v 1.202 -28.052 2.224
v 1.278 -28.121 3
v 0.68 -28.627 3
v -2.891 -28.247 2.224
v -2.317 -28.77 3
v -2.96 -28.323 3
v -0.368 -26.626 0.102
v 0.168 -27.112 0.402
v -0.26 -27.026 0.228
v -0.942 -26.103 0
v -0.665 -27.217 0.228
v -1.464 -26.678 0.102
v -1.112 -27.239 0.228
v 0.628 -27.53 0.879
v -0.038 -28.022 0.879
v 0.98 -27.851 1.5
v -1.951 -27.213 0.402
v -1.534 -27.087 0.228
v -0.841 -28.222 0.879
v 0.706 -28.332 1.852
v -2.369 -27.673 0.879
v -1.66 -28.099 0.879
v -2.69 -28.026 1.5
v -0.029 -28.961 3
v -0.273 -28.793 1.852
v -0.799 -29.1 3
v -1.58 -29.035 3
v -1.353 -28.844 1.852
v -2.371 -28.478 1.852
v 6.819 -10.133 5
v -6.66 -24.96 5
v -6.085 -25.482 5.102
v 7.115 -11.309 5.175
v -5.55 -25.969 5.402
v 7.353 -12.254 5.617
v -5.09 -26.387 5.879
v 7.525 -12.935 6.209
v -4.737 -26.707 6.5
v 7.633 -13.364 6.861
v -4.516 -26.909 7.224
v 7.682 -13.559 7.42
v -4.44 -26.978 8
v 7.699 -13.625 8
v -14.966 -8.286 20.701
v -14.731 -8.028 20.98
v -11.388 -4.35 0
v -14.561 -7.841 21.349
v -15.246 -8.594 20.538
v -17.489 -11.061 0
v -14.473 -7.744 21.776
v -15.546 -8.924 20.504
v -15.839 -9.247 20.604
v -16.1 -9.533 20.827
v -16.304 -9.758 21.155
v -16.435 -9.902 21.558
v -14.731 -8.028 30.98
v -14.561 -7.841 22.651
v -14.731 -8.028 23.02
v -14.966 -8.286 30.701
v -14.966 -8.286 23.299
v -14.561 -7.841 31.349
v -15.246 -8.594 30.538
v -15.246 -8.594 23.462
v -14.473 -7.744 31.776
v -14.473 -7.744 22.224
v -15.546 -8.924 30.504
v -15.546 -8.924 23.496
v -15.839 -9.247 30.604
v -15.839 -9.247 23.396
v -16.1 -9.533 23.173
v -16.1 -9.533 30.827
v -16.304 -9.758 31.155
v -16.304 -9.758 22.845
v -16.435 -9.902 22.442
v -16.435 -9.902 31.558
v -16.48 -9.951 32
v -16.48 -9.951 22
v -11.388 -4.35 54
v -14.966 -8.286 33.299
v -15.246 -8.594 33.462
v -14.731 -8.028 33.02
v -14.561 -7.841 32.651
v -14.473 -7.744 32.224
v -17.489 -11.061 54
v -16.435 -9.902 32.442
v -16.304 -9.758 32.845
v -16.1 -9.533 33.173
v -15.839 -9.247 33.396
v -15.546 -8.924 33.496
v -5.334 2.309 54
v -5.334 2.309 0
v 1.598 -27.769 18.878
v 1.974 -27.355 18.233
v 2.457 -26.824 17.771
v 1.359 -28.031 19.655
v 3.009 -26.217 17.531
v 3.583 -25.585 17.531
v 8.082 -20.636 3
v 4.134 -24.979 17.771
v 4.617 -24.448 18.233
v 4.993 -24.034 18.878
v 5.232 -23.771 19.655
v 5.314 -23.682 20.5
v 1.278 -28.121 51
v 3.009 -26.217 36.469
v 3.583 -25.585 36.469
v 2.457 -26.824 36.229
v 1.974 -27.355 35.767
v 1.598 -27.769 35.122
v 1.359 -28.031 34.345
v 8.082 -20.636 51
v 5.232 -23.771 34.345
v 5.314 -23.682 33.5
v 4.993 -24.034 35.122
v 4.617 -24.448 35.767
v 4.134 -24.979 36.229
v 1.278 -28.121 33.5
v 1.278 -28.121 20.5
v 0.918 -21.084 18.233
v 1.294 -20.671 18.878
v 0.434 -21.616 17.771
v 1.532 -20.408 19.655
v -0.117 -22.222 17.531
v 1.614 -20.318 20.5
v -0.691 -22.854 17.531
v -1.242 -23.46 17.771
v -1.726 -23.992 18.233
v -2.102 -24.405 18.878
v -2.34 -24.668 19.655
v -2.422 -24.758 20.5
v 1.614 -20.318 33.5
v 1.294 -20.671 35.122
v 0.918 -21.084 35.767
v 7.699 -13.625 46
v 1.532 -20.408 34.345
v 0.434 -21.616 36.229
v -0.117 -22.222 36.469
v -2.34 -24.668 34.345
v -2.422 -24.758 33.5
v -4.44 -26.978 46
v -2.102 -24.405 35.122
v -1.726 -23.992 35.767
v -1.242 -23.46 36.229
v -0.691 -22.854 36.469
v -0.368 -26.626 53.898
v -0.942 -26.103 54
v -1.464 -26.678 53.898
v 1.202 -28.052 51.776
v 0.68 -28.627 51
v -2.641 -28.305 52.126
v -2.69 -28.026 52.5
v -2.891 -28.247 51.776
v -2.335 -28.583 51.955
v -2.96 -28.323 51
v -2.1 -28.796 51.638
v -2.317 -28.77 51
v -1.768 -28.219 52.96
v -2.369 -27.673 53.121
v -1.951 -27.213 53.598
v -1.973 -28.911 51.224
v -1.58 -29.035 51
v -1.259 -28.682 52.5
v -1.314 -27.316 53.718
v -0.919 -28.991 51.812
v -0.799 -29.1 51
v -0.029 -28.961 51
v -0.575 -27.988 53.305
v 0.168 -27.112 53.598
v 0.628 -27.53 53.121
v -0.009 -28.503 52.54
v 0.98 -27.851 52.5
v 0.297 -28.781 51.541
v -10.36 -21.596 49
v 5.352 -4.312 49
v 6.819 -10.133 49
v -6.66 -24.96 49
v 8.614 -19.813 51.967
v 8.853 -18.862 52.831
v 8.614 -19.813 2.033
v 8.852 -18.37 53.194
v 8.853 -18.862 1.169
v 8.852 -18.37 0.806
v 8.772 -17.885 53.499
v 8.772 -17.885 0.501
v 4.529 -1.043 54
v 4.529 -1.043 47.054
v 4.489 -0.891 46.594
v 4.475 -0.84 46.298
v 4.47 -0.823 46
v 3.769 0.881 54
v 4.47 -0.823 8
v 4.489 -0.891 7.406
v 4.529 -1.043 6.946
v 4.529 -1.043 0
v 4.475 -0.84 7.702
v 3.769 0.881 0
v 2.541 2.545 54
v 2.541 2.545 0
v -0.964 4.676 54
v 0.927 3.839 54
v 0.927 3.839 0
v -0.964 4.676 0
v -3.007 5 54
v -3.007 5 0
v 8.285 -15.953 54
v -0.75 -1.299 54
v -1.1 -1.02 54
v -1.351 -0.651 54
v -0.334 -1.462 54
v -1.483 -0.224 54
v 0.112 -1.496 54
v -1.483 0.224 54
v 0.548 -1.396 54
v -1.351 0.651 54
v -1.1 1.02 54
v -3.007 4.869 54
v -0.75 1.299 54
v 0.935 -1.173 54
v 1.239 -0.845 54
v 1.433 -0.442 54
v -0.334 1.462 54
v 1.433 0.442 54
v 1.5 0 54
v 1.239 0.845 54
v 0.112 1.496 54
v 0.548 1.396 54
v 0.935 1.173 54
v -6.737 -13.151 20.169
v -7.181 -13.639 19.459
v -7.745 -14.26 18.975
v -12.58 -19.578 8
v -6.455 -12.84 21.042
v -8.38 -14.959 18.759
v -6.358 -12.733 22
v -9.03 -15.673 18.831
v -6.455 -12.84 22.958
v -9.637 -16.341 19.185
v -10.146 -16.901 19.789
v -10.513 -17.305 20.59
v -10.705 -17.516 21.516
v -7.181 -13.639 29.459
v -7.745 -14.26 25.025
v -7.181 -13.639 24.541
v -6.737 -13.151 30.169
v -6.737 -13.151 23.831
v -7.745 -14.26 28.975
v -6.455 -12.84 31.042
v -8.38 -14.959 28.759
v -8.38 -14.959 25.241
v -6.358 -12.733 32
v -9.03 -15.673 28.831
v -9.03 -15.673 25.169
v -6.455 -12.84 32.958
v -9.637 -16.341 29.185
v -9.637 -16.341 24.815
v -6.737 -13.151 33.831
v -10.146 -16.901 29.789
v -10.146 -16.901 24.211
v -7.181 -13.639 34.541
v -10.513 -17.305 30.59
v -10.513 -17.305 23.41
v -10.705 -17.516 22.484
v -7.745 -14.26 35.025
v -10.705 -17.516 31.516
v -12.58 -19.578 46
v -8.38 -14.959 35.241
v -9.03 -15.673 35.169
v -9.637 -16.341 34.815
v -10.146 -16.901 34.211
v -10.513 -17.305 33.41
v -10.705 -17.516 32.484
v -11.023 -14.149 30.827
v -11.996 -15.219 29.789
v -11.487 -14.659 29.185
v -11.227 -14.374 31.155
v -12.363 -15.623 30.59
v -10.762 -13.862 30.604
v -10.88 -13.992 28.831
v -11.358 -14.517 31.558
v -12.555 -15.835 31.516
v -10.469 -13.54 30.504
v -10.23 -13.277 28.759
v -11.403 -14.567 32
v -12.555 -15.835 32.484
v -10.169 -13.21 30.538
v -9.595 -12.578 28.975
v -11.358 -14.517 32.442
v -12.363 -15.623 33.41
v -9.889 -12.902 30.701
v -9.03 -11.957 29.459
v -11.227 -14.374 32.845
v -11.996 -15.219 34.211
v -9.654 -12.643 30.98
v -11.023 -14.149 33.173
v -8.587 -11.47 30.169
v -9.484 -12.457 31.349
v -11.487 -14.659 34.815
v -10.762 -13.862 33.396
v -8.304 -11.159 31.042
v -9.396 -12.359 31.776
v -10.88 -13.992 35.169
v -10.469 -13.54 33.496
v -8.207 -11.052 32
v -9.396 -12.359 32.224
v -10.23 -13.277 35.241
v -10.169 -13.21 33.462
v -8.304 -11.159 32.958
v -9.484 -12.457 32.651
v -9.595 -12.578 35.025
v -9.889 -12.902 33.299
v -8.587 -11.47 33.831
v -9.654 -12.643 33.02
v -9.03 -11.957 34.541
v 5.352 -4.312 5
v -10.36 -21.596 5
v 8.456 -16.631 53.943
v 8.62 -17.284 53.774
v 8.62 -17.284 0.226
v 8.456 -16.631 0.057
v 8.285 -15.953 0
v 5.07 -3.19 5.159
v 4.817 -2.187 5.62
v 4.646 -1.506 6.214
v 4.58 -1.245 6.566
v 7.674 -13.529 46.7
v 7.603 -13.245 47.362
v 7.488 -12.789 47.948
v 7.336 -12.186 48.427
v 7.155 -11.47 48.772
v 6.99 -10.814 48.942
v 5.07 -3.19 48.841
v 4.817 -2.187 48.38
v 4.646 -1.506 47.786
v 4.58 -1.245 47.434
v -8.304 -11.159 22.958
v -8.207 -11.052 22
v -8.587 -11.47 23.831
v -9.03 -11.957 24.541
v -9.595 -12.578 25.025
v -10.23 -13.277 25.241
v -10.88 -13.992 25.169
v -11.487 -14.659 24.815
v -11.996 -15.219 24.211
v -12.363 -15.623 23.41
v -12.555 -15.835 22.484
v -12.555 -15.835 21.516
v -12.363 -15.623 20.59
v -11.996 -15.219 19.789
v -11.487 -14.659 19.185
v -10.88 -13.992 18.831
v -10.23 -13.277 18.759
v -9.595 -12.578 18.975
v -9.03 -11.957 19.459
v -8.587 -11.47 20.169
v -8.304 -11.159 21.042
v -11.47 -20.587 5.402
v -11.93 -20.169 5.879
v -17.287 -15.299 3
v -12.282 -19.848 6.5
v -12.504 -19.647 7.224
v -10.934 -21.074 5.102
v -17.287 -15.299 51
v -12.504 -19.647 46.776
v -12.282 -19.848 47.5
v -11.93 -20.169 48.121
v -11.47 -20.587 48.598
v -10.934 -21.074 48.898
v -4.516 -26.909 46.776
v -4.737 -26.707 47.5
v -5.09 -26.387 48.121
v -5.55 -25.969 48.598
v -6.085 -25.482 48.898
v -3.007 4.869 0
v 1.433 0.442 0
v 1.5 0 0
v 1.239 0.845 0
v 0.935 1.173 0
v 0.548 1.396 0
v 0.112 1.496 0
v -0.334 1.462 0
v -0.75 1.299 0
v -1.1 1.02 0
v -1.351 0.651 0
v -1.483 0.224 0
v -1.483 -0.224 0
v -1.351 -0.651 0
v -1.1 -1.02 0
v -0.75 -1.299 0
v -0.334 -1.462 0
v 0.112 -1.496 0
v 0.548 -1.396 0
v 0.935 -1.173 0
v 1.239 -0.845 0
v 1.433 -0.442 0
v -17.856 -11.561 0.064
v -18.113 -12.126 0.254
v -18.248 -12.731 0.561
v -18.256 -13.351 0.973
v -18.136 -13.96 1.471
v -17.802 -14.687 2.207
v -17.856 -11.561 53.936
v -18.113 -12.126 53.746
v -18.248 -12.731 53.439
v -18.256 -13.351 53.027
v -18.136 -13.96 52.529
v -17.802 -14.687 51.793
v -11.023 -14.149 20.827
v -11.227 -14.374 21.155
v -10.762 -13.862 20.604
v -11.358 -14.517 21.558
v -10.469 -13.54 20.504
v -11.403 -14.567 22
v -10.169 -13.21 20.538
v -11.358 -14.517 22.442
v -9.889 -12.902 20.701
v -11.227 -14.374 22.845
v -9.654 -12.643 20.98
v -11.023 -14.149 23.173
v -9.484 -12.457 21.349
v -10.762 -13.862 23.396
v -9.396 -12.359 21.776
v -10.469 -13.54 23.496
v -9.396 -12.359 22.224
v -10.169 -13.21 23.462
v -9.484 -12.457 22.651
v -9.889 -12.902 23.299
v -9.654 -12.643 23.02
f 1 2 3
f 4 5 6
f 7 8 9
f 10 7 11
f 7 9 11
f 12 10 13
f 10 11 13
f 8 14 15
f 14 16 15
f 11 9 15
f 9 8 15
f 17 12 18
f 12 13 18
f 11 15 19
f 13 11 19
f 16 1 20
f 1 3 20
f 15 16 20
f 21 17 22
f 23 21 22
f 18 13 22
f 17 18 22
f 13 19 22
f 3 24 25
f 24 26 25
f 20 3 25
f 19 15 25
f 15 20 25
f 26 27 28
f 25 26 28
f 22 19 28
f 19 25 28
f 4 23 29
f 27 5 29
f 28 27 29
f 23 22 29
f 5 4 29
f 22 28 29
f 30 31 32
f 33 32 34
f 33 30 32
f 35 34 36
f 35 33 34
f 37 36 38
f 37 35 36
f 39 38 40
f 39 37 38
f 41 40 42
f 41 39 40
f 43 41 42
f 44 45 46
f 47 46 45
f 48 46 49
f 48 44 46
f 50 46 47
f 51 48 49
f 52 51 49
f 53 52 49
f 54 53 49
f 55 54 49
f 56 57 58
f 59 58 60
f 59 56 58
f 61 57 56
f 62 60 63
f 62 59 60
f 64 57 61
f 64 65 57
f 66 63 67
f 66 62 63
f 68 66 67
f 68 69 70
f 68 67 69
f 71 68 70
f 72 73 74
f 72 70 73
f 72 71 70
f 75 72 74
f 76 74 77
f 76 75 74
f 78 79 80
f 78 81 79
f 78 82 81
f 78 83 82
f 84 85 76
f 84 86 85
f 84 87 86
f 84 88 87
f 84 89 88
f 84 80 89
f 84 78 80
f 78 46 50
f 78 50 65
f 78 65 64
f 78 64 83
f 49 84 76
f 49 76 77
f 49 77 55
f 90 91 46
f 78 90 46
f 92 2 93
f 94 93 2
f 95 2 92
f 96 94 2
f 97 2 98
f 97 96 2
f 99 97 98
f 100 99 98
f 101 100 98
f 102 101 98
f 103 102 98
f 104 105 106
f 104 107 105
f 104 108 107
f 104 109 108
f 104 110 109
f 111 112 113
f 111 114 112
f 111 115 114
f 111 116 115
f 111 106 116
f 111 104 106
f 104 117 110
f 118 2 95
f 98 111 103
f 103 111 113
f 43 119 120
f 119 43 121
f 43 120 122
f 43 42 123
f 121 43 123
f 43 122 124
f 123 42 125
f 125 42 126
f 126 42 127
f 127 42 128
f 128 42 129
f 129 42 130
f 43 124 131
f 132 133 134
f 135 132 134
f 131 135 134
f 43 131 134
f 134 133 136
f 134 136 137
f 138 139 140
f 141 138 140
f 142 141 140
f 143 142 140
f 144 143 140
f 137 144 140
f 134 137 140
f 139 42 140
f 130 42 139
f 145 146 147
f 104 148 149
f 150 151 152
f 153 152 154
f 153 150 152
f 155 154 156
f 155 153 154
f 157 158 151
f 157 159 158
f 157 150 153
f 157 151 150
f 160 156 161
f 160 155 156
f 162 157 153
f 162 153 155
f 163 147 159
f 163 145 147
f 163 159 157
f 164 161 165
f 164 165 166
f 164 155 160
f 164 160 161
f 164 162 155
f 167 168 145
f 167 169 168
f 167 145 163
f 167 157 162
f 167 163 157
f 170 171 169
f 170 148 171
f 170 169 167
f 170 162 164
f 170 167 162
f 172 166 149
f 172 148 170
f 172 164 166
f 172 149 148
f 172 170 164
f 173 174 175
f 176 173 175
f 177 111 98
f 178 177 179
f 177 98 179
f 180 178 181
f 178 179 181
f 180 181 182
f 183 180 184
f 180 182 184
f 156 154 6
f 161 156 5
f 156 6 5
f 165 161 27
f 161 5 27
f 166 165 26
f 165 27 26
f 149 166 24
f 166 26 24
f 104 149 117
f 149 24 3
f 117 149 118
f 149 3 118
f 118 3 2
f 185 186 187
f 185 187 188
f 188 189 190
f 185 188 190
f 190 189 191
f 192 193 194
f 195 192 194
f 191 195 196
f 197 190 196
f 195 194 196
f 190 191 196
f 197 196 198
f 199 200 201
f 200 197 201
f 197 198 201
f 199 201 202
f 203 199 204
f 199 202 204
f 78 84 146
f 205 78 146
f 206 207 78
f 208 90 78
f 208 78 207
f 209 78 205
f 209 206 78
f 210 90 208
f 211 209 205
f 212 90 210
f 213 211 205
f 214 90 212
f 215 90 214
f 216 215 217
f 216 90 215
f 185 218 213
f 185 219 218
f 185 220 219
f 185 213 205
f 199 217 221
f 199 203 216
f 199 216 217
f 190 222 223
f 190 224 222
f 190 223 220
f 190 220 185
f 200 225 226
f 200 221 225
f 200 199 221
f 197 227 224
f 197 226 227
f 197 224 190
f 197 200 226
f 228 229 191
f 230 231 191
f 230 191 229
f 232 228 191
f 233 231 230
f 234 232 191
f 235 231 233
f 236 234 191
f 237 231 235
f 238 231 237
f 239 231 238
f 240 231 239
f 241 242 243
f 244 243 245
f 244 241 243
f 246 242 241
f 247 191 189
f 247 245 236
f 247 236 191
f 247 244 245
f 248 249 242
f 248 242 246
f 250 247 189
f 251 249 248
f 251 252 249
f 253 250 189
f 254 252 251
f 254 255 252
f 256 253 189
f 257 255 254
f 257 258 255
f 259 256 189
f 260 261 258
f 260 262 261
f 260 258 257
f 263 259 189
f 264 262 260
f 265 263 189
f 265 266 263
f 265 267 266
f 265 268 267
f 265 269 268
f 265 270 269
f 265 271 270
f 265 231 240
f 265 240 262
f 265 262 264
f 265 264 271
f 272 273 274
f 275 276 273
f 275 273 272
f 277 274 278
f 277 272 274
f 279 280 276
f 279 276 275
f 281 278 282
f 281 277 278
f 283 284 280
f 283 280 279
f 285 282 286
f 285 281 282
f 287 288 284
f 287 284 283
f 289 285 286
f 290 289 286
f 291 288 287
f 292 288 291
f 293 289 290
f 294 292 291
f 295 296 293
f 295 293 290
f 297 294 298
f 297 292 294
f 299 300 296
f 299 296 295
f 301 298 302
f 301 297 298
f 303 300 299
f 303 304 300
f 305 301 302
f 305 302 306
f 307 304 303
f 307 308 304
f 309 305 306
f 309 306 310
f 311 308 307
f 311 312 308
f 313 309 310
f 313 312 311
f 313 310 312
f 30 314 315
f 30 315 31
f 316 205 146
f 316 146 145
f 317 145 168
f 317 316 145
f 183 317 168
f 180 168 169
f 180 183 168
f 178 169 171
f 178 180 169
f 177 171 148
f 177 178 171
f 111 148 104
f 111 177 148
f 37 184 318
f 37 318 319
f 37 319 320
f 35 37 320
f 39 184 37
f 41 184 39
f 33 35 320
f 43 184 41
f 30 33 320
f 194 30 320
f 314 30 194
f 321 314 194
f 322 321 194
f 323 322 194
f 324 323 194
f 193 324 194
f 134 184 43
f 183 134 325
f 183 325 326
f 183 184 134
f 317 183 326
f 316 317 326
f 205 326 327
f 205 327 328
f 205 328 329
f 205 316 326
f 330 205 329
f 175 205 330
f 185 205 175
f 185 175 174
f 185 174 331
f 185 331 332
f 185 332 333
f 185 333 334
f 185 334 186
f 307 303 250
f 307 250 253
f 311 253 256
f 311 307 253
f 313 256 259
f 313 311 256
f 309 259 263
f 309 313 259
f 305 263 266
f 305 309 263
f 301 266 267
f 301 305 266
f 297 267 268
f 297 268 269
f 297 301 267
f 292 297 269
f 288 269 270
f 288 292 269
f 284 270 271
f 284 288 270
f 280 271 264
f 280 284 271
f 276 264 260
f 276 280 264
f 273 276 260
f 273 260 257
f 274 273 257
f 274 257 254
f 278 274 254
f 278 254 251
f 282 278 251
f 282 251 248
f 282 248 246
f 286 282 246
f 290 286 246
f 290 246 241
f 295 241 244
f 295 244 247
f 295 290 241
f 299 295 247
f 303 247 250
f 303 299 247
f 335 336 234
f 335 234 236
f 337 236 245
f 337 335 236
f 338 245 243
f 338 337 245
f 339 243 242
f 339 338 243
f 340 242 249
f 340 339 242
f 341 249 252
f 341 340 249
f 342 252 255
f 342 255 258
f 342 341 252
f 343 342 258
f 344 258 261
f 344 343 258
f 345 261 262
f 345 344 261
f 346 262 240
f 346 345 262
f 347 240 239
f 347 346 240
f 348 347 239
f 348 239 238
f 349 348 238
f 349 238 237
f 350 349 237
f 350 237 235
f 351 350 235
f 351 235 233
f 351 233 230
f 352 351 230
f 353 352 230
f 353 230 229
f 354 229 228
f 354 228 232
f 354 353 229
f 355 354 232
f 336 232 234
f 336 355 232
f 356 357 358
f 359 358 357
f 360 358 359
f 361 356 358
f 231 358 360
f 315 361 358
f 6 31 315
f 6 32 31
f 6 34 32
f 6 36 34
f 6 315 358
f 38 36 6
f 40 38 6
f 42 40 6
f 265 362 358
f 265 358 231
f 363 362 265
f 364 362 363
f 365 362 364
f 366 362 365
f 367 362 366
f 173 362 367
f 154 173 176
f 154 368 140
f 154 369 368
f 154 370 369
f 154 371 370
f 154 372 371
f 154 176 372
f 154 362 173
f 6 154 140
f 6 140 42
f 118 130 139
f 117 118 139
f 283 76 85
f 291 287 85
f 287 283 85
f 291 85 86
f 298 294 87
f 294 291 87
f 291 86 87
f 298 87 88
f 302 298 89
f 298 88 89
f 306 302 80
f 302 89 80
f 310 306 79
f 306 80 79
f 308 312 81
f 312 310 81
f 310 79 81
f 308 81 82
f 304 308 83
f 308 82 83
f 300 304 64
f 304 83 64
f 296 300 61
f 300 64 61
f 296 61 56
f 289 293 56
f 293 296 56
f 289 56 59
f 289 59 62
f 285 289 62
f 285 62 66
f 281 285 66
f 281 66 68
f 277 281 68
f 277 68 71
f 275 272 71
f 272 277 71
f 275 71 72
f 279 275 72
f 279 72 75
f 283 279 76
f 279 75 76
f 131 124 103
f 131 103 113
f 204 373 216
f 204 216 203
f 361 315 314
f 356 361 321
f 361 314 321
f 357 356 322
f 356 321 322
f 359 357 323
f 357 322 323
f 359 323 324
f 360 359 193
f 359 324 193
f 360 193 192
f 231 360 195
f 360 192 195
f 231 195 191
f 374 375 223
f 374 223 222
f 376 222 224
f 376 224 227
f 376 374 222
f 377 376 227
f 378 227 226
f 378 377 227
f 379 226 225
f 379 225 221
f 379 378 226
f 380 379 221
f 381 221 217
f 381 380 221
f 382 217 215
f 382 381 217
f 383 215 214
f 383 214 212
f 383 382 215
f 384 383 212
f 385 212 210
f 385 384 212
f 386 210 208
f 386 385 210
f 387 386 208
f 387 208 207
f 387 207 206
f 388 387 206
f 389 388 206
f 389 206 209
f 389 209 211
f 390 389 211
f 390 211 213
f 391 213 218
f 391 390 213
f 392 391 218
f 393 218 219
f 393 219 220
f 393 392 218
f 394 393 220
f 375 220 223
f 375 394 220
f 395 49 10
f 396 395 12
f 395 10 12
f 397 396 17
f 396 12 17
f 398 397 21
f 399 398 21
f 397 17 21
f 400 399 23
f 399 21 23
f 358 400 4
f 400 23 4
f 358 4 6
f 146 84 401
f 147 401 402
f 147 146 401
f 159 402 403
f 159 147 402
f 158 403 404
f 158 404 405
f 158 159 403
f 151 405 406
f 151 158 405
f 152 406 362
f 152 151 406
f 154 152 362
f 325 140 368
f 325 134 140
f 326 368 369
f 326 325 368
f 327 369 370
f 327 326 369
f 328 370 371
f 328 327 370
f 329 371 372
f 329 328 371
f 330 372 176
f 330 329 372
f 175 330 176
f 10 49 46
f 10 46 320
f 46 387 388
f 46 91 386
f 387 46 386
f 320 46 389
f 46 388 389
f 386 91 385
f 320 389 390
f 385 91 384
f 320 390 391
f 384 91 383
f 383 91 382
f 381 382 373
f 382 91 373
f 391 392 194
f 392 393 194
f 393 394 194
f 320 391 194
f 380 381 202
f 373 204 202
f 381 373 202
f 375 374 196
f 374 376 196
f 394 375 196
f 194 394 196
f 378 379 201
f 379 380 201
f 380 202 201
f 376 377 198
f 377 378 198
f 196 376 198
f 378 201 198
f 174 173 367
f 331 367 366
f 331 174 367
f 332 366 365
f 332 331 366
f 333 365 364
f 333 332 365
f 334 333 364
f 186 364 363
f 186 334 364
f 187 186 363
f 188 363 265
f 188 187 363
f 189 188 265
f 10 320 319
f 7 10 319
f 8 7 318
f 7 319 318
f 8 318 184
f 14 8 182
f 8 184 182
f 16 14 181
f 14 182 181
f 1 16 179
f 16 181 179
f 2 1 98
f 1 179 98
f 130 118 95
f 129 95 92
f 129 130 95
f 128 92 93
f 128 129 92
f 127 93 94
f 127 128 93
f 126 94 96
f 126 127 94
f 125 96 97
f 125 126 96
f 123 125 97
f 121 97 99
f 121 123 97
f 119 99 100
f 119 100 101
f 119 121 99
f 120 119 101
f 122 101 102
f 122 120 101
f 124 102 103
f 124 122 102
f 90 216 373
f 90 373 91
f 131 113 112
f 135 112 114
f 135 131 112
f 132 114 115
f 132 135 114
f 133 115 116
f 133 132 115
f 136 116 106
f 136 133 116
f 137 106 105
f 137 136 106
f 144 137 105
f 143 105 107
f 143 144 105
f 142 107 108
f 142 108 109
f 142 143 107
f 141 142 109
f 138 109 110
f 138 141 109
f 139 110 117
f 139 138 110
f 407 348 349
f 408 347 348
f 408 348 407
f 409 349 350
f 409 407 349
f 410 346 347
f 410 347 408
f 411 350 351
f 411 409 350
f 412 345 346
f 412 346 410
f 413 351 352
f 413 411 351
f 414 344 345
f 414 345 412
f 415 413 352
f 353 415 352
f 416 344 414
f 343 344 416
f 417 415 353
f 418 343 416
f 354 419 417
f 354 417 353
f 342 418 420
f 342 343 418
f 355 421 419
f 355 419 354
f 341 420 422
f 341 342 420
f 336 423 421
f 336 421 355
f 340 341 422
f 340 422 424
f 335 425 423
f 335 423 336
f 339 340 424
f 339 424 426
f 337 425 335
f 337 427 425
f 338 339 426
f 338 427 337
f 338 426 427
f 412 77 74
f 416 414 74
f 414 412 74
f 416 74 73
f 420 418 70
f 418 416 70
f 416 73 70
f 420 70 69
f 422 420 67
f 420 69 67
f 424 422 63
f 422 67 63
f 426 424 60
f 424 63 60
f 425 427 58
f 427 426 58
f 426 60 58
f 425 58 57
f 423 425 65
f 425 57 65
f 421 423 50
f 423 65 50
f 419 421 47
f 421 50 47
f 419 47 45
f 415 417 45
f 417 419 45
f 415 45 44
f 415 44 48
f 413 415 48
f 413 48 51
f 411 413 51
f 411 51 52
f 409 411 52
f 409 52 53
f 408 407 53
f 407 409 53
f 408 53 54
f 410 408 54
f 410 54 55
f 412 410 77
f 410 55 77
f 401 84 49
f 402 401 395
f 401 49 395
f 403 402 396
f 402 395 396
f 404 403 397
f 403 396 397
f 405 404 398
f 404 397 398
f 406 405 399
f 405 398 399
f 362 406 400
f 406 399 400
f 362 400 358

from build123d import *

# Parameters (mm, degrees)
SKETCH_1_W          = 6.01304928
SKETCH_1_H          = 10
SKETCH_1_R          = 1.5
EXTRUDE_1_DEPTH     = 54
EXTRUDE_2_DEPTH     = 54
SKETCH_3_W          = 11.000516989
SKETCH_3_H          = 44
CUT_EXTRUDE_1_DEPTH = 54
FILLET_1_R          = 3
SKETCH_4_R          = 1.5
CUT_EXTRUDE_2_DEPTH = 65.758340749
CUT_EXTRUDE_START   = -8
SKETCH_5_R          = 1.5
CUT_EXTRUDE_3_DEPTH = 8
CUT_EXTRUDE_START_2 = -2.5
SKETCH_6_R          = 3.25
SKETCH_6_R_2        = 1.5
CUT_EXTRUDE_4_DEPTH = 2.5
FILLET_2_R          = 8


with BuildPart() as part:
    # 草图1 → 凸台-拉伸1 (new body)
    with BuildSketch(Plane.XY):
        Rectangle(SKETCH_1_W, SKETCH_1_H)
        Circle(SKETCH_1_R, mode=Mode.SUBTRACT)
    extrude(amount=EXTRUDE_1_DEPTH)

    # 草图2 → 凸台-拉伸2 (add)
    with BuildSketch(Plane.XY.offset(54)):
        Polygon((-3.00652464, 4.869160707), (-5.333618016, 2.309357993), (-11.387673162, -4.350102667), (-19.506532138, -13.280847541), (-0.740319183, -30.341041136), (9.164728063, -19.445489164), (3.00652464, 5), (3.00652464, -5), (-3.00652464, -5), align=None)
    extrude(amount=-EXTRUDE_2_DEPTH)

    # 草图3 → 切除-拉伸1 (cut)
    with BuildSketch(Plane(origin=(-15.436861734, -16.980547908, 0), x_dir=(0.7399400733959437, -0.6726727939963125, 0), z_dir=(-0.6726727939963125, -0.7399400733959437, 0))):
        with Locations((9.361542588, 27)):
            Rectangle(SKETCH_3_W, SKETCH_3_H)
    extrude(amount=-CUT_EXTRUDE_1_DEPTH, mode=Mode.SUBTRACT)

    # 圆角1
    fillet_1_edges = [part.edges().sort_by_distance(p)[0] for p in [
        (-19.506532138, -13.280847541, 27),
        (4.21220444, -24.89326515, 54),
        (9.164728063, -19.445489164, 27),
        (-10.123425661, -21.810944338, 54),
        (-0.740319183, -30.341041136, 27),
        (4.21220444, -24.89326515, 0),
        (-10.123425661, -21.810944338, 0),
        (1.629252849, -20.301477526, 5),
        (-4.053507722, -10.199069972, 5),
        (-4.053507722, -10.199069972, 49),
        (1.629252849, -20.301477526, 49),
    ]]
    fillet(fillet_1_edges, radius=FILLET_1_R)

    # 草图4 → 切除-拉伸2 (cut, through all)
    with BuildSketch(Plane(origin=(-4.069670404, 3.699700367, 0), x_dir=(0, 0, 1), z_dir=(-0.7399400733959431, 0.6726727939963131, 0))):
        with Locations(Location((22, -16.948544778, 0), (0, 0, 270))):
            Circle(SKETCH_4_R)
        with Locations(Location((32, -16.948544778, 0), (0, 0, 270))):
            Circle(SKETCH_4_R)
    extrude(amount=-CUT_EXTRUDE_2_DEPTH, mode=Mode.SUBTRACT)

    # 草图5 → 切除-拉伸3 (cut)
    # profile 1 of 3: a face of its own
    with BuildSketch(Plane(origin=(14.696542551, -13.360493228, 0), x_dir=(0, 0, -1), z_dir=(0.7399400733959434, -0.6726727939963129, 0)).offset(CUT_EXTRUDE_START)):
        with BuildLine():
            Line((-33.5, -19.948544778), (-30.5, -19.948544778))
            ThreePointArc((-30.5, -19.948544778), (-27.5, -16.948544778), (-30.5, -13.948544778))
            Line((-30.5, -13.948544778), (-33.5, -13.948544778))
            ThreePointArc((-33.5, -13.948544778), (-36.5, -16.948544778), (-33.5, -19.948544778))
        make_face()
        with Locations(Location((-32, -16.948544778, 0), (0, 0, 270))):
            Circle(SKETCH_5_R, mode=Mode.SUBTRACT)
    # profile 2 of 3: a face of its own
    with BuildSketch(Plane(origin=(14.696542551, -13.360493228, 0), x_dir=(0, 0, -1), z_dir=(0.7399400733959434, -0.6726727939963129, 0)).offset(CUT_EXTRUDE_START)):
        with BuildLine():
            ThreePointArc((-23.5, -13.948544778), (-26.5, -16.948544778), (-23.5, -19.948544778))
            Line((-23.5, -19.948544778), (-30.5, -19.948544778))
            ThreePointArc((-30.5, -19.948544778), (-27.5, -16.948544778), (-30.5, -13.948544778))
            Line((-30.5, -13.948544778), (-23.5, -13.948544778))
        make_face()
    # profile 3 of 3: a face of its own
    with BuildSketch(Plane(origin=(14.696542551, -13.360493228, 0), x_dir=(0, 0, -1), z_dir=(0.7399400733959434, -0.6726727939963129, 0)).offset(CUT_EXTRUDE_START)):
        with BuildLine():
            Line((-23.5, -19.948544778), (-20.5, -19.948544778))
            ThreePointArc((-20.5, -19.948544778), (-17.5, -16.948544778), (-20.5, -13.948544778))
            Line((-20.5, -13.948544778), (-23.5, -13.948544778))
            ThreePointArc((-23.5, -13.948544778), (-26.5, -16.948544778), (-23.5, -19.948544778))
        make_face()
        with Locations(Location((-22, -16.948544778, 0), (0, 0, 270))):
            Circle(SKETCH_5_R, mode=Mode.SUBTRACT)
    extrude(amount=CUT_EXTRUDE_3_DEPTH, mode=Mode.SUBTRACT)

    # 草图6 → 切除-拉伸4 (cut)
    # profile 1 of 2: a face of its own
    with BuildSketch(Plane(origin=(2.857118835, -2.597380759, 0), x_dir=(0, 0, -1), z_dir=(0.7399400733959437, -0.6726727939963125, 0)).offset(CUT_EXTRUDE_START_2)):
        with Locations(Location((-32, -16.948544778, 0), (0, 0, 90))):
            Circle(SKETCH_6_R)
        with Locations(Location((-32, -16.948544778, 0), (0, 0, 270))):
            Circle(SKETCH_6_R_2, mode=Mode.SUBTRACT)
    # profile 2 of 2: a face of its own
    with BuildSketch(Plane(origin=(2.857118835, -2.597380759, 0), x_dir=(0, 0, -1), z_dir=(0.7399400733959437, -0.6726727939963125, 0)).offset(CUT_EXTRUDE_START_2)):
        with Locations(Location((-22, -16.948544778, 0), (0, 0, 90))):
            Circle(SKETCH_6_R)
        with Locations(Location((-22, -16.948544778, 0), (0, 0, 270))):
            Circle(SKETCH_6_R_2, mode=Mode.SUBTRACT)
    extrude(amount=CUT_EXTRUDE_4_DEPTH, mode=Mode.SUBTRACT)

    # 圆角2
    # the kernel refuses this fillet: 8 mm, written as the material it takes off along each edge
    with BuildSketch(Plane(origin=(3.00652464, 5, -15.578572112), x_dir=(0.24428365244033365, -0.9697038192924736, 0), z_dir=(0, 0, 1))) as fillet_2_piece_1:
        with BuildLine():
            CenterArc((6.231428845, -8), FILLET_2_R, 90, 74.267861836)
            Line((-1.468889641, -5.830876853), (-1.62289601, -5.78749439))
            ThreePointArc((-1.62289601, -5.78749439), (-0.889597431, -2.876353042), (-0.155152611, 0.039085384))
            Line((-0.155152611, 0.039085384), (0, 0.16))
            Line((0, 0.16), (6.231428845, 0.16))
            Line((6.231428845, 0.16), (6.231428845, 0))
        make_face()
    extrude(amount=85.157144223, mode=Mode.SUBTRACT)


solid = part.part
